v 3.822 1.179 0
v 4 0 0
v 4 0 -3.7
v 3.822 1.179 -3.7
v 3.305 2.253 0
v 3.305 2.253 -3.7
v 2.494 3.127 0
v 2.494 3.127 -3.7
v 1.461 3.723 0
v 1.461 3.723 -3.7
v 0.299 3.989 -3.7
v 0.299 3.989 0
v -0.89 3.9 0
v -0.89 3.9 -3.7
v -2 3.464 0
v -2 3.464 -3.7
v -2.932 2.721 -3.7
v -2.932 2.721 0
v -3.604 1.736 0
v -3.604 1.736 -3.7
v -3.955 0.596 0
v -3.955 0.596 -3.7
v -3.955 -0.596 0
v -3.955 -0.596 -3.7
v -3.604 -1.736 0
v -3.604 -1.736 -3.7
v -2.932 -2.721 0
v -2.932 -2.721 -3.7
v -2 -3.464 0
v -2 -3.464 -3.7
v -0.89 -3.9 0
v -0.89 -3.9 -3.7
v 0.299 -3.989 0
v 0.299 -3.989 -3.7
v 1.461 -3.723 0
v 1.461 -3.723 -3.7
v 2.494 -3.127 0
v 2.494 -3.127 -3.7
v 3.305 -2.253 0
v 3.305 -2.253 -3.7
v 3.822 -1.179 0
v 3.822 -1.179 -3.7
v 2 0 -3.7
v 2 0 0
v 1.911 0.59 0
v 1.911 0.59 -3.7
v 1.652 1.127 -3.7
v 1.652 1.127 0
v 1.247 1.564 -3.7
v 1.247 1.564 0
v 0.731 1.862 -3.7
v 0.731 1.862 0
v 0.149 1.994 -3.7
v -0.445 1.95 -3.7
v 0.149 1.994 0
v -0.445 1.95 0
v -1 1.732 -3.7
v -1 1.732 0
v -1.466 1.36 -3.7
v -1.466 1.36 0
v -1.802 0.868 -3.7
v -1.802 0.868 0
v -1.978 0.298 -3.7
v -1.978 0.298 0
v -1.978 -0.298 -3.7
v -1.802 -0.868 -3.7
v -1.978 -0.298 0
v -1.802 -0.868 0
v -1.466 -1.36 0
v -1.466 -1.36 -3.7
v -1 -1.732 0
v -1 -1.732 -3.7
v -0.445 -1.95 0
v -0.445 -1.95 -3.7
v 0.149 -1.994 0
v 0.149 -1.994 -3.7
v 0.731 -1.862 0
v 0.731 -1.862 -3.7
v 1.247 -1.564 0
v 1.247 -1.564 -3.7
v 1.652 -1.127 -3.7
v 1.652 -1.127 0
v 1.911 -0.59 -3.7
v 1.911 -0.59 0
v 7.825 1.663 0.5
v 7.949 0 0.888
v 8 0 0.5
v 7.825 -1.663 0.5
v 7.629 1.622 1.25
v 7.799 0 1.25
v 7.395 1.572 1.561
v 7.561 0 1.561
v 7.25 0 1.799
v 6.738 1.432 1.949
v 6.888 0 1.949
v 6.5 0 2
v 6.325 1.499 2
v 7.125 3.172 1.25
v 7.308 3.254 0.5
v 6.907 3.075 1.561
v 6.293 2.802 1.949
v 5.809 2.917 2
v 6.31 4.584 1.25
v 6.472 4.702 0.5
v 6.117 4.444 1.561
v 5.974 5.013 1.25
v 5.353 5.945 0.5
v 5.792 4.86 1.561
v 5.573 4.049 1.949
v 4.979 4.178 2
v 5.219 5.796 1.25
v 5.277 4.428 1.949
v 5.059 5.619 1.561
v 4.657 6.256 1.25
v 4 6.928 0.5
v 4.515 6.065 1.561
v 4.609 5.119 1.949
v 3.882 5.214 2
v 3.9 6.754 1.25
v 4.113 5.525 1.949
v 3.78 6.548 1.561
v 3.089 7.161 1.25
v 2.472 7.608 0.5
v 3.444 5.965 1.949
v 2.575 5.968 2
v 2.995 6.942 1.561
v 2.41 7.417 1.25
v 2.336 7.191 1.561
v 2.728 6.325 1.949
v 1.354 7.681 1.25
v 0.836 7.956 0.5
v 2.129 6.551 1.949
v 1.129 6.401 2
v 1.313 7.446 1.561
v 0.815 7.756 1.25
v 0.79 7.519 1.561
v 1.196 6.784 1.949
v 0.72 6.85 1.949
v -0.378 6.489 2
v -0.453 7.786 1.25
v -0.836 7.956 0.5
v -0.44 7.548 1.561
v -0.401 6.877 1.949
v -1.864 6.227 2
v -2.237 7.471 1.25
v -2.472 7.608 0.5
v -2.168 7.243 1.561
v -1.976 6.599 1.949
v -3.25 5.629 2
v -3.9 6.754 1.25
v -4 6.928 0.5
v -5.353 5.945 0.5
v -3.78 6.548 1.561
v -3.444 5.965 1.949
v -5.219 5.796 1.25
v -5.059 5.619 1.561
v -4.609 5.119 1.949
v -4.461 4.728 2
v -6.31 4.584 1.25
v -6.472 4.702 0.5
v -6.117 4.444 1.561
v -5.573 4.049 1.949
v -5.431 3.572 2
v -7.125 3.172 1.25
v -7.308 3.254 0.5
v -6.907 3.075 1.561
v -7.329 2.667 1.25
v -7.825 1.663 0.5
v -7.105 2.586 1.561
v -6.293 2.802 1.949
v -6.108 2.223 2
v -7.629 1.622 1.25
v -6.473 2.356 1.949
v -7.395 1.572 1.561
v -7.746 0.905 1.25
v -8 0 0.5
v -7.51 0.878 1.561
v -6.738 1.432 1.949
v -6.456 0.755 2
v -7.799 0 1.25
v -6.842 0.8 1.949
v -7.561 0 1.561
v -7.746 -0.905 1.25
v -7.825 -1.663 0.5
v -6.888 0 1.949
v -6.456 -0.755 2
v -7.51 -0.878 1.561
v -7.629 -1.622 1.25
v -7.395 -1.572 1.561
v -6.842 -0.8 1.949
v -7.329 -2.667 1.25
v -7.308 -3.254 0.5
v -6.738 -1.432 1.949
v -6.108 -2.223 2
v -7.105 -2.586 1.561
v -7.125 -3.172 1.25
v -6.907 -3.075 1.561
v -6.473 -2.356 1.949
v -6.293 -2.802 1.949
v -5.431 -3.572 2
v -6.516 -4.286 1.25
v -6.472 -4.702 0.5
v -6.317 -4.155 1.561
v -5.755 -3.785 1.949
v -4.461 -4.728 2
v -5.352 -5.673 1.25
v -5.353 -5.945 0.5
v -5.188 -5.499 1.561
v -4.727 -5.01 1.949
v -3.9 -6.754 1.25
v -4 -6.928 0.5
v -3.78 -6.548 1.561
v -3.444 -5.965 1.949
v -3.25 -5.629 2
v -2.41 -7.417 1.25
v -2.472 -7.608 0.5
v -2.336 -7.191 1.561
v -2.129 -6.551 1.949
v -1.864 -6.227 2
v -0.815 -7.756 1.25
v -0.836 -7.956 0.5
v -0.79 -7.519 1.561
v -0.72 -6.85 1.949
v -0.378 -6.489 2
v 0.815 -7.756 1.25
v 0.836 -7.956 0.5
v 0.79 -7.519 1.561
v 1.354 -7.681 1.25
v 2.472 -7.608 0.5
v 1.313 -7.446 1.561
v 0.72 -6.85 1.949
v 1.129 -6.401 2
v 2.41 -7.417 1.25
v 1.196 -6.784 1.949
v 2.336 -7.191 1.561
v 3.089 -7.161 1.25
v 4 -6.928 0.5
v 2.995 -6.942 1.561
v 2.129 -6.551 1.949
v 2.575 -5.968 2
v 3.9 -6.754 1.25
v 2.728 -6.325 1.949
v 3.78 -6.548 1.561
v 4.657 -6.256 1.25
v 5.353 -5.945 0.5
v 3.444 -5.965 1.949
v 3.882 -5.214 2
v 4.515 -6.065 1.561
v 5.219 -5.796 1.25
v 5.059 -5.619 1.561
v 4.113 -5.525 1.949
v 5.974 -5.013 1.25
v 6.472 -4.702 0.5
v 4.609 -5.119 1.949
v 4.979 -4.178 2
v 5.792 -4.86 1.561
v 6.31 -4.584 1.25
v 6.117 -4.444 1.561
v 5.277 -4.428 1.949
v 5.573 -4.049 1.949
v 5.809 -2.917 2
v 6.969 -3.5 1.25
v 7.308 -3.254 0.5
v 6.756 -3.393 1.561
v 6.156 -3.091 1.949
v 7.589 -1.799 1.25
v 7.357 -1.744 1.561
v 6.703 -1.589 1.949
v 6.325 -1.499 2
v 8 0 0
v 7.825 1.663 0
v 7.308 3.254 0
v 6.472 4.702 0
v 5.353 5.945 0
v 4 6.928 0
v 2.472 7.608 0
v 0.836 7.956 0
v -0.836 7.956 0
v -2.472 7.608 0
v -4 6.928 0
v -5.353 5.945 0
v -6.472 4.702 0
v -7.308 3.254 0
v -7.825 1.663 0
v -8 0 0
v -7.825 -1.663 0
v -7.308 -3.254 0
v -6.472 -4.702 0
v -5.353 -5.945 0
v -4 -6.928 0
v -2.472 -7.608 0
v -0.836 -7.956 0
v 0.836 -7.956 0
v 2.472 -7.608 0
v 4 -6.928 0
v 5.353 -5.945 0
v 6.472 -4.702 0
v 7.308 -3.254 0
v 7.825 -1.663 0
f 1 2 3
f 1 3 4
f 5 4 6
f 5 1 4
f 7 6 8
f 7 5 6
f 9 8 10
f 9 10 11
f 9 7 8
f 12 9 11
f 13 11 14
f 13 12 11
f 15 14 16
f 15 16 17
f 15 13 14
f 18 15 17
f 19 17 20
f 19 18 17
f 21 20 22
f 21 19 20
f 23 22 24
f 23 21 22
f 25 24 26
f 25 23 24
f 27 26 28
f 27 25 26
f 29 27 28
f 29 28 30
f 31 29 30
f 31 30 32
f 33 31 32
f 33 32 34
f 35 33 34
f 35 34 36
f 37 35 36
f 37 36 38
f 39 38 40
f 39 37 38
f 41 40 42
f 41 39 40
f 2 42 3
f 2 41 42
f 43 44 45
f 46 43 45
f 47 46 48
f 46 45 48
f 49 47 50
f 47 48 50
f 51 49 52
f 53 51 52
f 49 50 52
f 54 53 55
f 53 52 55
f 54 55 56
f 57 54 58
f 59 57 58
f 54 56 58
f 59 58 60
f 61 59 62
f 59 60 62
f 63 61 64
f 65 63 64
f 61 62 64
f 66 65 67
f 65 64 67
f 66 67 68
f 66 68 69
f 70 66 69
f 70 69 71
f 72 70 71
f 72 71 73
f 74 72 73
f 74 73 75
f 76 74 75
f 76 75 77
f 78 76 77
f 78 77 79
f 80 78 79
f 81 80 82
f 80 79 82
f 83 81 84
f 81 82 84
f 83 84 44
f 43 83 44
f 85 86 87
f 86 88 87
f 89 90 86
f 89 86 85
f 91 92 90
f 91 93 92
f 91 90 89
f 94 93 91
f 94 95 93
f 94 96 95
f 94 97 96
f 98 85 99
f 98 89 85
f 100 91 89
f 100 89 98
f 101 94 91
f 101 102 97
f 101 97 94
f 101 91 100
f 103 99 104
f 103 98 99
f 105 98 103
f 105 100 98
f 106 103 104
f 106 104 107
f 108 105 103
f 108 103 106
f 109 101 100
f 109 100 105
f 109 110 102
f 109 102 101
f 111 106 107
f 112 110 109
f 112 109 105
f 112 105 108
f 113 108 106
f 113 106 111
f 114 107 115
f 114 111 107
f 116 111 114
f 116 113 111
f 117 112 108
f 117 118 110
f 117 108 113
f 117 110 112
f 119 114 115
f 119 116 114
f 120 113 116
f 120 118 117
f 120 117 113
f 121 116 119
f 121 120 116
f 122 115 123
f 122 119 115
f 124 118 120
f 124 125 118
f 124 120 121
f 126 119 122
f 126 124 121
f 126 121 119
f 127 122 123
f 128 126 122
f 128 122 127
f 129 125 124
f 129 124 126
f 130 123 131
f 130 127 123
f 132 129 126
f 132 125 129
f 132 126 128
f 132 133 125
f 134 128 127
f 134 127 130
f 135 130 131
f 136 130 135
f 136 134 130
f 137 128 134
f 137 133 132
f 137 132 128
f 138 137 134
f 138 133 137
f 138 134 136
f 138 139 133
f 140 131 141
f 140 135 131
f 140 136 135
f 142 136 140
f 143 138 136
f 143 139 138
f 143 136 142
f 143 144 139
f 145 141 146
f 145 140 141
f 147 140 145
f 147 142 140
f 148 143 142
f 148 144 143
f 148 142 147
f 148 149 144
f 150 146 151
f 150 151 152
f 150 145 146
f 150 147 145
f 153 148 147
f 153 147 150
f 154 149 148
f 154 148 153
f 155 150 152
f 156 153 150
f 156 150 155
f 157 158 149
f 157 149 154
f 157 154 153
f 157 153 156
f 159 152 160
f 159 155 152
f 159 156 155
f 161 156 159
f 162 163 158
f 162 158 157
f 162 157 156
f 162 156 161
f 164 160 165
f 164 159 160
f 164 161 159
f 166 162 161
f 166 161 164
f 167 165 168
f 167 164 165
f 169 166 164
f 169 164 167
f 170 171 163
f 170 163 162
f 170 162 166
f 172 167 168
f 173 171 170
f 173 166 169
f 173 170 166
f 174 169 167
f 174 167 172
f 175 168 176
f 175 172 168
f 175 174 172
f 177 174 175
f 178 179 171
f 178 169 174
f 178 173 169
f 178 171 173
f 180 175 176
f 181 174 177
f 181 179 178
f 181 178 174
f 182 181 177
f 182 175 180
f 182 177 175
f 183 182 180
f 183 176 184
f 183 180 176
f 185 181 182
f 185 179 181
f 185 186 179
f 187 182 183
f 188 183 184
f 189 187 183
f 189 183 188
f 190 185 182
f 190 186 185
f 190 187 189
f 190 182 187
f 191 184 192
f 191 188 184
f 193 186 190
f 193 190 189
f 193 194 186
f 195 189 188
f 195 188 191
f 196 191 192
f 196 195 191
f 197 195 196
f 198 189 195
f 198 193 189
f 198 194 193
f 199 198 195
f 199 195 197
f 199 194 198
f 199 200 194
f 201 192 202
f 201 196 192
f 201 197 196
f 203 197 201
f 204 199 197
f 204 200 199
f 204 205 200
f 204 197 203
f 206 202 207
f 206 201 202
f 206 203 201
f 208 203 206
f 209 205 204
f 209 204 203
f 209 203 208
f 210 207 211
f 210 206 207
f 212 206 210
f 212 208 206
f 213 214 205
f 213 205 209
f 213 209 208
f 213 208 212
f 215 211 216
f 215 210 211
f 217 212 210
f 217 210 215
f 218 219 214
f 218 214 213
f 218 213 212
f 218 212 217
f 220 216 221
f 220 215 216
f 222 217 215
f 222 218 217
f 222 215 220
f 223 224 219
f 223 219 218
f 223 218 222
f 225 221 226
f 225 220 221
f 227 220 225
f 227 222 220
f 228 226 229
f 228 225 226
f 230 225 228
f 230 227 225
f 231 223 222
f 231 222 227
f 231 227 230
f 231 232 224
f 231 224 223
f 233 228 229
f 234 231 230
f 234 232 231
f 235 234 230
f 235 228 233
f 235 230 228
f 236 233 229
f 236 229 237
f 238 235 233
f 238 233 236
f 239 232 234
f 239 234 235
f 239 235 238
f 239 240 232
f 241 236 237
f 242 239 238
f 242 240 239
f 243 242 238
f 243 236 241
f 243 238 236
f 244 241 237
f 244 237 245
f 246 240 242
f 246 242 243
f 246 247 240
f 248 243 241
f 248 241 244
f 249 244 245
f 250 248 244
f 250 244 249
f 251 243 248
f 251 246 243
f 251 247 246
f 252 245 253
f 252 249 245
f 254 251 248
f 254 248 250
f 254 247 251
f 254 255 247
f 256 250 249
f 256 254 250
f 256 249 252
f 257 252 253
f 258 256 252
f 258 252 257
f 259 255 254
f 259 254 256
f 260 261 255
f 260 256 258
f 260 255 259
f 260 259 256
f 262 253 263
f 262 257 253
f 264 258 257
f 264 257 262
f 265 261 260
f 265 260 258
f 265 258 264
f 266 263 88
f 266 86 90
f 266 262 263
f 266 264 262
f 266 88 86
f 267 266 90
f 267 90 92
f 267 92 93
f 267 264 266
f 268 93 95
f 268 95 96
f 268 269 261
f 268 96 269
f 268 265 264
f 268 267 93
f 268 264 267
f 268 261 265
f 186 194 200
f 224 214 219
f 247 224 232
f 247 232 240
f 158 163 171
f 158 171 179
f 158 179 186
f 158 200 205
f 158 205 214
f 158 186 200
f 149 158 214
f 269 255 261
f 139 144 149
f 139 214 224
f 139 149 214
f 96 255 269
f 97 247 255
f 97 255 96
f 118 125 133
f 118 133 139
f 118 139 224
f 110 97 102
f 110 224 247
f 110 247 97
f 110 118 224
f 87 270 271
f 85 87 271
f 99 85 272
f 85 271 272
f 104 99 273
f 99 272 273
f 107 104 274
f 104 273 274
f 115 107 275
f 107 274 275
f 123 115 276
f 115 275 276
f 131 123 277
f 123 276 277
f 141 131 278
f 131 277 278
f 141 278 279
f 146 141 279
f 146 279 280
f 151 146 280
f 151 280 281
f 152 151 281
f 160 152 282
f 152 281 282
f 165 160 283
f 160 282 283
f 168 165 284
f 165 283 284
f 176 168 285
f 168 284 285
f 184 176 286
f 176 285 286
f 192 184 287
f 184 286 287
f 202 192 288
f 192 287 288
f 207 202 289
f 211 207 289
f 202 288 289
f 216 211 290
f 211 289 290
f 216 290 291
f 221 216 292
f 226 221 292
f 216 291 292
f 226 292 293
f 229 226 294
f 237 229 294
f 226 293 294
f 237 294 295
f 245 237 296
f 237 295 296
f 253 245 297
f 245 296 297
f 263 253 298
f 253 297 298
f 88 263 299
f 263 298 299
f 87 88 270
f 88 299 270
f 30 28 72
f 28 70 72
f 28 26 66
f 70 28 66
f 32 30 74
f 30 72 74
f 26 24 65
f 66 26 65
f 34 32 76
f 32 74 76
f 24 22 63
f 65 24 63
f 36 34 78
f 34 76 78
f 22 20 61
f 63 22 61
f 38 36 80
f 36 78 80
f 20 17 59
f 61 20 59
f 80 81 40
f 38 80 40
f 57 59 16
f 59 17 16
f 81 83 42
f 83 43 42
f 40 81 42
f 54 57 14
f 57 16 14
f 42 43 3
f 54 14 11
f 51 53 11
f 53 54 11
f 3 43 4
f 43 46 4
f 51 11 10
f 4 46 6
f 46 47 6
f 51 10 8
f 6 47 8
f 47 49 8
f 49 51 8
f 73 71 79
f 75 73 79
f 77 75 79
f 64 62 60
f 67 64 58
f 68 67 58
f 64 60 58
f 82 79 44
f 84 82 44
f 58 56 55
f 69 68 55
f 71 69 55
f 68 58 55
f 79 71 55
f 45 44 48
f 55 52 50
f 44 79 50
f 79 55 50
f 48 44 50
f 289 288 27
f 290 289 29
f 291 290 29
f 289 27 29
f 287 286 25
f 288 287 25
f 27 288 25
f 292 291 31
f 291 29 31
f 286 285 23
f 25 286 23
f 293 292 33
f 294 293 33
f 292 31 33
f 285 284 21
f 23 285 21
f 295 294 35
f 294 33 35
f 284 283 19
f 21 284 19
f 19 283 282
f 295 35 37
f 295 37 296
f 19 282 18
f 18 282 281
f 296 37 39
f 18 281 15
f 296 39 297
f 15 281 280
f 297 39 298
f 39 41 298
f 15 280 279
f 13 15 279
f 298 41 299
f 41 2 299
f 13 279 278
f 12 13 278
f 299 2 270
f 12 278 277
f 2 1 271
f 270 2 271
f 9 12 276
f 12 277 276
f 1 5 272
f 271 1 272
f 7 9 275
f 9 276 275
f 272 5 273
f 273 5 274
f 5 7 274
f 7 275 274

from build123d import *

# Parameters (mm, degrees)
F0_R     = 8
F0_R_2   = 4
F0_R_3   = 2
F1_DEPTH = 2
F2_DEPTH = 3.7
F3_R     = 1.5


with BuildPart() as f1:
    # F0 (on Top) → F1 (new body)
    with BuildSketch(Plane.XY):
        Circle(F0_R)
        Circle(F0_R_2, mode=Mode.SUBTRACT)
        Circle(F0_R_2)
        Circle(F0_R_3, mode=Mode.SUBTRACT)
        Circle(F0_R_3)
    extrude(amount=F1_DEPTH)

    # F0 (on Top) → F2 (join)
    with BuildSketch(Plane.XY):
        Circle(F0_R_2)
        Circle(F0_R_3, mode=Mode.SUBTRACT)
    extrude(amount=-F2_DEPTH)

    # F3
    f3_edges = [f1.edges().sort_by_distance(p)[0] for p in [
        (-8, 0, 2),
    ]]
    fillet(f3_edges, radius=F3_R)


solid = f1.part
